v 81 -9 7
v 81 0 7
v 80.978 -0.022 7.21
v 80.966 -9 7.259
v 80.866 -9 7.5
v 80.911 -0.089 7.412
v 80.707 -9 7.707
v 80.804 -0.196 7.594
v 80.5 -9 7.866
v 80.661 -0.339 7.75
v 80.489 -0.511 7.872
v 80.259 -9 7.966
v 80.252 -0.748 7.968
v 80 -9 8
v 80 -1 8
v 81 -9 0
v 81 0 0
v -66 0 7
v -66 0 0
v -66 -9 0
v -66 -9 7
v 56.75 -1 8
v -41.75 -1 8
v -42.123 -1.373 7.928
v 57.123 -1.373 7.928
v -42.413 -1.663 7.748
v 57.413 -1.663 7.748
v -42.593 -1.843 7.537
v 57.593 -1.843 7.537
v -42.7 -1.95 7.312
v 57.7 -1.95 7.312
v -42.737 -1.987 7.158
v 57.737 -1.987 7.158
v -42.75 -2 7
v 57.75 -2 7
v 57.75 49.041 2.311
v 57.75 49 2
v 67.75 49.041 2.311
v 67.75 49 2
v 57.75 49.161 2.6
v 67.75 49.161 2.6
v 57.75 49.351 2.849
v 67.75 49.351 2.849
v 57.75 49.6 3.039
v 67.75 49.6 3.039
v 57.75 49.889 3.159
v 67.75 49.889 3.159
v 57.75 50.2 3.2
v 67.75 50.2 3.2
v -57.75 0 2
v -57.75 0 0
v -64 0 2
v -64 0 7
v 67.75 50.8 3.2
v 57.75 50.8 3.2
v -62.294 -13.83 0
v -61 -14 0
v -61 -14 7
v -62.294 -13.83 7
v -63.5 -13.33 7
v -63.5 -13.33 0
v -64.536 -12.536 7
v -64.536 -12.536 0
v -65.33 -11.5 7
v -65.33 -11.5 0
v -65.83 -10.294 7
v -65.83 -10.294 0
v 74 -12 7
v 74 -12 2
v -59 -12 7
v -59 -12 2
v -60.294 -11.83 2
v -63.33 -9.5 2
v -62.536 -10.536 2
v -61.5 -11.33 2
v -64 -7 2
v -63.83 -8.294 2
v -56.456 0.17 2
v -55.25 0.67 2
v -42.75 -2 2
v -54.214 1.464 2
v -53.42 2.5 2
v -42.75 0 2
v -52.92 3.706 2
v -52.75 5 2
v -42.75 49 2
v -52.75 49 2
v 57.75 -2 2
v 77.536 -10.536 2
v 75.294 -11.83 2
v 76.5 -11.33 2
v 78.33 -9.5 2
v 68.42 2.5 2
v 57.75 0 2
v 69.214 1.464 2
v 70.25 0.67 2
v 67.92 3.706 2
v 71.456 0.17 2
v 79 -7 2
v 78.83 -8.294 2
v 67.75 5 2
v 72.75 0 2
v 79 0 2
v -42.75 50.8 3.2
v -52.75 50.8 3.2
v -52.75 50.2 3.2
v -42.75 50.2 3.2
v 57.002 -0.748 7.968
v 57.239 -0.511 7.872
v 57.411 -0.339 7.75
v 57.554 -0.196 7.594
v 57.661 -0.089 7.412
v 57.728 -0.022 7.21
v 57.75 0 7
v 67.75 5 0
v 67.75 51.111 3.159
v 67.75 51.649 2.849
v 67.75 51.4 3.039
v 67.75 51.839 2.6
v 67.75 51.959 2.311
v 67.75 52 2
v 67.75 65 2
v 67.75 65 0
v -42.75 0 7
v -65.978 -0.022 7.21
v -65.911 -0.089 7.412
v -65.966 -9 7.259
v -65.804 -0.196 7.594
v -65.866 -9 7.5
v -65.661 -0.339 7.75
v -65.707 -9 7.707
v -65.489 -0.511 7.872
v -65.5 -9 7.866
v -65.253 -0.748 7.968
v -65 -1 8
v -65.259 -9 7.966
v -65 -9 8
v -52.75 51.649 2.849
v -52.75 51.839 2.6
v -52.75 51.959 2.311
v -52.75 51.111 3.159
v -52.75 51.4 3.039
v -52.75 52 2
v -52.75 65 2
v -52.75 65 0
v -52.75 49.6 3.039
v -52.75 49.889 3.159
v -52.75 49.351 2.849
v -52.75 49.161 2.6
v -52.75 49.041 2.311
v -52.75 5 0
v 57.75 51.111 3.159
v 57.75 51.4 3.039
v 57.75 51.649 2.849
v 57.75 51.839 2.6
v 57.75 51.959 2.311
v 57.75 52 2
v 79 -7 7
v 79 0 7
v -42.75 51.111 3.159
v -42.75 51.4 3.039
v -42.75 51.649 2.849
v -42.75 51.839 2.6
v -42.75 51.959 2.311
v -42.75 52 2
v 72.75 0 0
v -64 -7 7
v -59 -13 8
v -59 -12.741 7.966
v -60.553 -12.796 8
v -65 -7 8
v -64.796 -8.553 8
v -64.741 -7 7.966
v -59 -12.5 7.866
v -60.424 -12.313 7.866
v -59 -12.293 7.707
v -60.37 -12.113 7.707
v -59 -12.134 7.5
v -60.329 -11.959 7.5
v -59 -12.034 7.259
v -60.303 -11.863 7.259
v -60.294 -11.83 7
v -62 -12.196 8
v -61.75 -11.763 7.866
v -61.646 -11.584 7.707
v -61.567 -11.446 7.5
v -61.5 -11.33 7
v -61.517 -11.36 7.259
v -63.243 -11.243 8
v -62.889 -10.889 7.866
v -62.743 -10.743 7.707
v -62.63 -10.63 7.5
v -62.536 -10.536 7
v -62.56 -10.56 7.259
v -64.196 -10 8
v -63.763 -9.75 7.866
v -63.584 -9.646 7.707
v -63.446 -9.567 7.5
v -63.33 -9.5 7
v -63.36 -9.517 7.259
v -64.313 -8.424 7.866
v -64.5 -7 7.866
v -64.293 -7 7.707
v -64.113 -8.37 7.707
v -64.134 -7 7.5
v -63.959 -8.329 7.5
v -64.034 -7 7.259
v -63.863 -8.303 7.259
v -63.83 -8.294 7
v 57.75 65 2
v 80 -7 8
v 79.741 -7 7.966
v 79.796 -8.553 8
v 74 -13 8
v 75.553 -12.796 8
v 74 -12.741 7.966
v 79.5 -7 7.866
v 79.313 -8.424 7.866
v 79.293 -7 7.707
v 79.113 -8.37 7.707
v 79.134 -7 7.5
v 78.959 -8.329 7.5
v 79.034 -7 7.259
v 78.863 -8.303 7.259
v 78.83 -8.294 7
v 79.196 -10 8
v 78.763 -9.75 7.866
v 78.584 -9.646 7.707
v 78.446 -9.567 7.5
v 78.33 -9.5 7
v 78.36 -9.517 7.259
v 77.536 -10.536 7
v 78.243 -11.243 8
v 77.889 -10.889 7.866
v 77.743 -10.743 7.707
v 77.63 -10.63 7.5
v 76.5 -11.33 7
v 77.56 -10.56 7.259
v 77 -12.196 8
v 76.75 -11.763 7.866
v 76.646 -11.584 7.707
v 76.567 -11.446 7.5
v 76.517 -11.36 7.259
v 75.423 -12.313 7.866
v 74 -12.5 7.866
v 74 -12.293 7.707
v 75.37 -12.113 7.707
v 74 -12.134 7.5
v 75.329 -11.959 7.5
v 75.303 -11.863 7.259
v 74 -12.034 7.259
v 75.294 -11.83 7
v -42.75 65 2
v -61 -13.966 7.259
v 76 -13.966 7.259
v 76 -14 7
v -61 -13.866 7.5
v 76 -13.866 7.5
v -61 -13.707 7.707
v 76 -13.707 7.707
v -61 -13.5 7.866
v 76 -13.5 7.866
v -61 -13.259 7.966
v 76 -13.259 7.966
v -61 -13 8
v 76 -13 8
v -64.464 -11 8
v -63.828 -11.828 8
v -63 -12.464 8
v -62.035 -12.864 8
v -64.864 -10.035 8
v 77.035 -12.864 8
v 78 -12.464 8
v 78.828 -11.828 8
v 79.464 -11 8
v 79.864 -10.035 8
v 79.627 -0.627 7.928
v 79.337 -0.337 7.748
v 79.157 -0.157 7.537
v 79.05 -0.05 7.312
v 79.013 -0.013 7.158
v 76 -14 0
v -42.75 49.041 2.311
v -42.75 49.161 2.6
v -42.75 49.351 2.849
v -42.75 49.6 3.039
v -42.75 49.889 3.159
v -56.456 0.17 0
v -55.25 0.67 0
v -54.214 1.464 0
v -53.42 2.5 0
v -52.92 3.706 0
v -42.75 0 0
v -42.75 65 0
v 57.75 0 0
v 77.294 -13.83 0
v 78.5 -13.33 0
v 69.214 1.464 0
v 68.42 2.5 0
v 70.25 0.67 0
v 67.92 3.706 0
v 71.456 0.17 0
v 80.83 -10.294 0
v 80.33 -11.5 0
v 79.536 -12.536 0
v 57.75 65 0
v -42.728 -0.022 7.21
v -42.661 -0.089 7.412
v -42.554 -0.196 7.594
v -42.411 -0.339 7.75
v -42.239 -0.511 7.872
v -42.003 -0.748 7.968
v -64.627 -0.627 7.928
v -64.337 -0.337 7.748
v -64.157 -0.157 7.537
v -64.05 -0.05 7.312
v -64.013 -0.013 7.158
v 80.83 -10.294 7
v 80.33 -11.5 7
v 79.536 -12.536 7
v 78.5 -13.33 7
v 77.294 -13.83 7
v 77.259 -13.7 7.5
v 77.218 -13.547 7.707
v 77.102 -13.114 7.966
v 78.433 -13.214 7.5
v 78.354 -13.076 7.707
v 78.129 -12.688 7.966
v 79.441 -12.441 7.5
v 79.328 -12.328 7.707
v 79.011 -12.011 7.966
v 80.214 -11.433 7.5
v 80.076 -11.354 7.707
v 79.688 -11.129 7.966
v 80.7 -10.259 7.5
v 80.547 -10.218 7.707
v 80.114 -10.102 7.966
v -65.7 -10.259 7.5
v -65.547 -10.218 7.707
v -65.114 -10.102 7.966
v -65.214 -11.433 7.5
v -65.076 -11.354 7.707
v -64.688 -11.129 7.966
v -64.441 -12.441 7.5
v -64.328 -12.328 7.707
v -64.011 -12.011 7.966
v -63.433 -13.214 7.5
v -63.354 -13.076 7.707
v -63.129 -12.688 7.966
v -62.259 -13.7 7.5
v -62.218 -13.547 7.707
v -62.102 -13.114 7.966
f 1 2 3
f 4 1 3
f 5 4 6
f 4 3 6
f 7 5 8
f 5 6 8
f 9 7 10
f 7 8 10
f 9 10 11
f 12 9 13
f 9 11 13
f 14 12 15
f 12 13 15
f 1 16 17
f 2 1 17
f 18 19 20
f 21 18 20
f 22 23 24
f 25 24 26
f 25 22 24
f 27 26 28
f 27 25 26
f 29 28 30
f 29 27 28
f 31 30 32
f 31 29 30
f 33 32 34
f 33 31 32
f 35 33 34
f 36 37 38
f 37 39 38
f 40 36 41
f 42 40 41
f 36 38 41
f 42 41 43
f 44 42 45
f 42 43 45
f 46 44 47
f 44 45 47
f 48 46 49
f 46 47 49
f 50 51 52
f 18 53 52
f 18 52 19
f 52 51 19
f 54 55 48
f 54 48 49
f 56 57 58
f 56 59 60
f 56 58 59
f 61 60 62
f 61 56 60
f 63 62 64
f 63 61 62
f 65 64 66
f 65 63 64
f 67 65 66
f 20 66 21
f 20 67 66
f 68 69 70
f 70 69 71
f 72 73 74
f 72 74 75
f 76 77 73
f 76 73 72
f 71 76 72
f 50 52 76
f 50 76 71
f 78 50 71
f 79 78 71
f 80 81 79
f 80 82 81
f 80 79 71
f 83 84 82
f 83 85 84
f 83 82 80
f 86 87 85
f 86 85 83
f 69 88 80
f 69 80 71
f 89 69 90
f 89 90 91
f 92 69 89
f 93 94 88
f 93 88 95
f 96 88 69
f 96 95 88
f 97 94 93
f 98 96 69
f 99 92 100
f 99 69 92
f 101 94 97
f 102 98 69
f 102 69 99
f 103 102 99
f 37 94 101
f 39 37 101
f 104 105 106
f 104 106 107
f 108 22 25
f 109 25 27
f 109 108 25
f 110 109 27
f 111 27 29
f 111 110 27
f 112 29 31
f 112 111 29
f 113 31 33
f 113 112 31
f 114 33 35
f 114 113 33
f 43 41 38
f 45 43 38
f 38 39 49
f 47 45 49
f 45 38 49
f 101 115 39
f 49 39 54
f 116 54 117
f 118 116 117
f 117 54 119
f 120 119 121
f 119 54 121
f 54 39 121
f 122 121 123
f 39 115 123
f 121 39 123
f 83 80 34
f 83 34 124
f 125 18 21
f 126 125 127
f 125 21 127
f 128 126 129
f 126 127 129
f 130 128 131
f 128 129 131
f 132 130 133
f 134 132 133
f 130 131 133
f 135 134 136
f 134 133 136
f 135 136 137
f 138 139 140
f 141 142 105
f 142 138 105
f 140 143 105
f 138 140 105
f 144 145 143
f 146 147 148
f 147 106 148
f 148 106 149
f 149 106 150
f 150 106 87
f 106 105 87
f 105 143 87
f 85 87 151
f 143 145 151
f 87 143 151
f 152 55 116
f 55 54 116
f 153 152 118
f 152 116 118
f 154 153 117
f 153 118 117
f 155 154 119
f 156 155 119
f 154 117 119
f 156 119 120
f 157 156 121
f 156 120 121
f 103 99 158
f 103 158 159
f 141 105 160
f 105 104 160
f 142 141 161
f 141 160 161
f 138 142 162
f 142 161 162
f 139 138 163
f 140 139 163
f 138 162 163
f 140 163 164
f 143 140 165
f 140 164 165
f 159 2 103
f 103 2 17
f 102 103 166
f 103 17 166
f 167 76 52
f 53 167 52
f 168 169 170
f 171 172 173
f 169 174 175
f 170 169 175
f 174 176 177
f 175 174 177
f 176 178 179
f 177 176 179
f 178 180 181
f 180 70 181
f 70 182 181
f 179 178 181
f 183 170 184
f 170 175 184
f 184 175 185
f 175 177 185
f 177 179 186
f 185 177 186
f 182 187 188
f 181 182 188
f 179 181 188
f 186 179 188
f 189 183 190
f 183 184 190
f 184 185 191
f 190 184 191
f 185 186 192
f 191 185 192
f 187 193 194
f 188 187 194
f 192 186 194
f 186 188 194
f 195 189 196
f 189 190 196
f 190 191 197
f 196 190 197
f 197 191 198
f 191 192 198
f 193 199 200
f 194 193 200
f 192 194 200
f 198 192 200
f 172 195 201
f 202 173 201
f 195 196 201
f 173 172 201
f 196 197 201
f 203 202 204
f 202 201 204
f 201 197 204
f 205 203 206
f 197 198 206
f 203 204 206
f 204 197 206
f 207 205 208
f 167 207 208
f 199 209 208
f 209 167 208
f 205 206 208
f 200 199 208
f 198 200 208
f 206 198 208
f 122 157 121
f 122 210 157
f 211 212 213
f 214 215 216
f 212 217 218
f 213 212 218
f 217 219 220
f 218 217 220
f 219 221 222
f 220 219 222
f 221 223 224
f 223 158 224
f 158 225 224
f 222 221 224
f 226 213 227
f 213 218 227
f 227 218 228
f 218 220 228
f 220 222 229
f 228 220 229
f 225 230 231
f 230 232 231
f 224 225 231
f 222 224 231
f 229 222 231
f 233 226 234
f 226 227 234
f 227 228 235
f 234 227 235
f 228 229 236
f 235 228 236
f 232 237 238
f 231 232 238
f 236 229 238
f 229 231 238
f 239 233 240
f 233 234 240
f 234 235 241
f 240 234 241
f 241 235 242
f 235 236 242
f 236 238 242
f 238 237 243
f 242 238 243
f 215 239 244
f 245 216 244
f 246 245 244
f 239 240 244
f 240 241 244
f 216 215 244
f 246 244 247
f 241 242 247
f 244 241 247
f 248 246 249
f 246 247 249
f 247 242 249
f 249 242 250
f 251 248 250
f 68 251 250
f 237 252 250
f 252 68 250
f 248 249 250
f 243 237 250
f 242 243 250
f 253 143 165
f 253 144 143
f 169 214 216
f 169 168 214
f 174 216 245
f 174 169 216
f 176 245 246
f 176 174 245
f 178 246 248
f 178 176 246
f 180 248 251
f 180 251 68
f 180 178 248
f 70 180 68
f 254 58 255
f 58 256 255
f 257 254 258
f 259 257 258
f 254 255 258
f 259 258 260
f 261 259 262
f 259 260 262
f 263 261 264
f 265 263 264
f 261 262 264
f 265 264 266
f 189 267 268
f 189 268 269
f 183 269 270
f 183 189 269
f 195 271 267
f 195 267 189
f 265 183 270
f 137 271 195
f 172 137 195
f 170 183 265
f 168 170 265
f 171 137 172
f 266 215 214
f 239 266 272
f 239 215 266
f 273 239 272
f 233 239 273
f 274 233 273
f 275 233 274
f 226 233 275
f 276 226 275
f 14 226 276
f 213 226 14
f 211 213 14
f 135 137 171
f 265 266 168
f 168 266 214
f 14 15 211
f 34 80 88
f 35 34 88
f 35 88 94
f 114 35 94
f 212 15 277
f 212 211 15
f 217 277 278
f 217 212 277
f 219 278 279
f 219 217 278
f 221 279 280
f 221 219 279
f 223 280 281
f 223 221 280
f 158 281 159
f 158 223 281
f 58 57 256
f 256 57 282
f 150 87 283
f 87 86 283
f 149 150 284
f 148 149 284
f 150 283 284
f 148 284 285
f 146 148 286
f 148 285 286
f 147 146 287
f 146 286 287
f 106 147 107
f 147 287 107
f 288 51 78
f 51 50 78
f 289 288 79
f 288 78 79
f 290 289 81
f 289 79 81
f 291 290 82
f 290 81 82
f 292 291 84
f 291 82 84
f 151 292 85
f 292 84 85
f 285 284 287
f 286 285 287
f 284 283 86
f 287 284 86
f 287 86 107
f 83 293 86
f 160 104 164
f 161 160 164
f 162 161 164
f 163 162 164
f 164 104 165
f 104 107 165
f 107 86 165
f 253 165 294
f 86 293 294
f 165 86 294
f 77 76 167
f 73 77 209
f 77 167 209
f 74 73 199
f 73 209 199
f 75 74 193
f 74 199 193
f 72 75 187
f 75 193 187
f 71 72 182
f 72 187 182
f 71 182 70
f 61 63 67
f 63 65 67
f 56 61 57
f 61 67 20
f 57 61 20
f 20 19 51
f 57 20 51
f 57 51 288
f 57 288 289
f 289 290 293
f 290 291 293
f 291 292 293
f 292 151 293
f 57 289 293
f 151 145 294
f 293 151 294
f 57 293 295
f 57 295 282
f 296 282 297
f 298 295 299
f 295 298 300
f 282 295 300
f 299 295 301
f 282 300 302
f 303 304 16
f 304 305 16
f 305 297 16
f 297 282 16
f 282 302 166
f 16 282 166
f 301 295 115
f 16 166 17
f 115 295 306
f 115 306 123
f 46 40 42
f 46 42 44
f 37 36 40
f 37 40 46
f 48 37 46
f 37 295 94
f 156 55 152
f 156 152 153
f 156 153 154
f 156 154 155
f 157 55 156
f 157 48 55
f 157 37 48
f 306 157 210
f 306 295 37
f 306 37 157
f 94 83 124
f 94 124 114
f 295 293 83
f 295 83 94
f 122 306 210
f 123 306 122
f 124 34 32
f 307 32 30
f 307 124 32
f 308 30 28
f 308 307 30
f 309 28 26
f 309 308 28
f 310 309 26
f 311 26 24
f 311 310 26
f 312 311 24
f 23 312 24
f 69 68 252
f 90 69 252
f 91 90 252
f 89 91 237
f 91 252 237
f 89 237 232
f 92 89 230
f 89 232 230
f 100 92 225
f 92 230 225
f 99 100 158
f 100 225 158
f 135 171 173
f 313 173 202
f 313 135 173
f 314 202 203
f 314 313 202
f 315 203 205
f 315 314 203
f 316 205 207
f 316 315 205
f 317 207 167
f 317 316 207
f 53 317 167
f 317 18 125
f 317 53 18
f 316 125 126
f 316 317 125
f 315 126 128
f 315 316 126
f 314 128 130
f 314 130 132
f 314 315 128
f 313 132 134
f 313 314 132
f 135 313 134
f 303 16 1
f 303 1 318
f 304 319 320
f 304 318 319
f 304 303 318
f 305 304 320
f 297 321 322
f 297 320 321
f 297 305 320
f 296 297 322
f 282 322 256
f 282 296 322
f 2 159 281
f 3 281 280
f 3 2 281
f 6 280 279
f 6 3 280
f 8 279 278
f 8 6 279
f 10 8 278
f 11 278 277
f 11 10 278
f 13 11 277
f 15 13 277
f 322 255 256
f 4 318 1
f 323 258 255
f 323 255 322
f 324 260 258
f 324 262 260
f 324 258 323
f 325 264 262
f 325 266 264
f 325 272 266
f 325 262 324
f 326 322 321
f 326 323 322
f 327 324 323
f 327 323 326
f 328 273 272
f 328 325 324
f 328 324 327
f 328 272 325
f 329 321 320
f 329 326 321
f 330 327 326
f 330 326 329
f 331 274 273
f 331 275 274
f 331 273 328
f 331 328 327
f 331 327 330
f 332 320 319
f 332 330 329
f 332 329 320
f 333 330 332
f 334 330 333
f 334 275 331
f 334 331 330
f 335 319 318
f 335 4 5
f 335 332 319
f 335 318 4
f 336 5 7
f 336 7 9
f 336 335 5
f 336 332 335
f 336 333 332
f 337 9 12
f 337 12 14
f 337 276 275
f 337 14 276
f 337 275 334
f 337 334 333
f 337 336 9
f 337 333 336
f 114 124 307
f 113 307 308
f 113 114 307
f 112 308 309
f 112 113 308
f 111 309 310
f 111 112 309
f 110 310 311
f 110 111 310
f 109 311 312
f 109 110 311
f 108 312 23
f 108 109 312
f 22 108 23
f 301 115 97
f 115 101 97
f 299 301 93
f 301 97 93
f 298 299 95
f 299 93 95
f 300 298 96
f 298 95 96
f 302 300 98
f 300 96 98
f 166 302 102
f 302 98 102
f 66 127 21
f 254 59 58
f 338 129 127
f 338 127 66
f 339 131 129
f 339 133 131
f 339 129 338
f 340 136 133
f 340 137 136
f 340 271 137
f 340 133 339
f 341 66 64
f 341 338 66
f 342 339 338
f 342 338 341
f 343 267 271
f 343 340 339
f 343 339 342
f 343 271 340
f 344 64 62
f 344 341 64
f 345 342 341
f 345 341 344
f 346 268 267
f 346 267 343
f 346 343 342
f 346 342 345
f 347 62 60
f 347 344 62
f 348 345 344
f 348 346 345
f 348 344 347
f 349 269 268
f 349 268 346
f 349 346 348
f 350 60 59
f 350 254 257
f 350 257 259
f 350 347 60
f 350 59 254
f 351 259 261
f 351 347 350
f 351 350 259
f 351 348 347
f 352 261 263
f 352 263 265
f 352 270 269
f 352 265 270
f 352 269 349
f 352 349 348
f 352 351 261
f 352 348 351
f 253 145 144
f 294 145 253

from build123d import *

# Parameters (mm, degrees)
F2_W     = 10
F2_H     = 65
F2_W_2   = 11.25
F2_H_2   = 12
F2_W_3   = 100.5
F2_H_3   = 2
F2_W_4   = 2
F2_H_4   = 10
F3_DEPTH = 2
F4_DEPTH = 8
F5_R     = 5
F6_R     = 0.99999
F7_W     = 10
F7_H     = 3
F8_DEPTH = 1.2
F9_R     = 1.19999


# Not quite as in the source:
# - a fillet or chamfer is up to 0.001 mm smaller than in the source, because OpenCascade refuses the exact size


with BuildPart() as f3:
    # F2 (on Top) → F3 (new body)
    with BuildSketch(Plane.XY):
        with Locations((-47.7500067828, 32.5)):
            Rectangle(F2_W, F2_H)
        Polygon((-42.7500067828, 0), (-52.7500067828, 0), (-52.7500067828, -12), (-42.7500067828, -12), (-42.7500067828, -2), align=None)
        with Locations((-58.3750067828, -6)):
            Rectangle(F2_W_2, F2_H_2)
        with Locations((7.4999932172, -1)):
            Rectangle(F2_W_3, F2_H_3)
        Polygon((-42.7500067828, -12), (-52.7500067828, -12), (-64.0000067828, -12), (-66.0000067828, -12), (-66.0000067828, -14), (80.9999932172, -14), (80.9999932172, -12), (78.9999932172, -12), (67.7499932172, -12), (57.7499932172, -12), align=None)
        with Locations((-65.0000067828, -6)):
            Rectangle(F2_W_4, F2_H_2)
        with Locations((62.7499932172, 32.5)):
            Rectangle(F2_W, F2_H)
        Polygon((67.7499932172, 0), (57.7499932172, 0), (57.7499932172, -2), (57.7499932172, -12), (67.7499932172, -12), align=None)
        with Locations((73.3749932172, -6)):
            Rectangle(F2_W_2, F2_H_2)
        with Locations((79.9999932172, -6)):
            Rectangle(F2_W_4, F2_H_2)
        with Locations((7.4999932172, -7)):
            Rectangle(F2_W_3, F2_H_4)
    extrude(amount=F3_DEPTH)

    # F2 (on Top) → F4 (join)
    with BuildSketch(Plane.XY):
        with Locations((-65.0000067828, -6)):
            Rectangle(F2_W_4, F2_H_2)
        Polygon((-42.7500067828, -12), (-52.7500067828, -12), (-64.0000067828, -12), (-66.0000067828, -12), (-66.0000067828, -14), (80.9999932172, -14), (80.9999932172, -12), (78.9999932172, -12), (67.7499932172, -12), (57.7499932172, -12), align=None)
        with Locations((79.9999932172, -6)):
            Rectangle(F2_W_4, F2_H_2)
        with Locations((7.4999932172, -1)):
            Rectangle(F2_W_3, F2_H_3)
    extrude(amount=F4_DEPTH)

    # F5
    f5_edges = [f3.edges().sort_by_distance(p)[0] for p in [
        (-66.000007, -14, 4),
        (80.999993, -14, 4),
        (-64.000007, -12, 5),
        (78.999993, -12, 5),
        (67.749993, 0, 1),
        (-52.750007, 0, 1),
    ]]
    fillet(f5_edges, radius=F5_R)

    # F6 (radius 1 in the source; OpenCascade refuses exactly that, so slightly less here)
    f6_edges = [f3.edges().sort_by_distance(p)[0] for p in [
        (7.499993, -14, 8),
        (7.499993, -12, 8),
        (79.999993, 0, 8),
        (-65.000007, 0, 8),
        (7.499993, -2, 8),
        (7.499993, 0, 8),
        (57.749993, -1, 8),
        (-42.750007, -1, 8),
    ]]
    fillet(f6_edges, radius=F6_R)

    # F7 (on face) → F8 (join)
    with BuildSketch(Plane.XY.offset(2)):
        with Locations((-47.7500067828, 50.5)):
            Rectangle(F7_W, F7_H)
        with Locations((62.7499932172, 50.5)):
            Rectangle(F7_W, F7_H)
    extrude(amount=F8_DEPTH)

    # F9 (radius 1.2 in the source; OpenCascade refuses exactly that, so slightly less here)
    f9_edges = [f3.edges().sort_by_distance(p)[0] for p in [
        (-47.750007, 49, 3.2),
        (-47.750007, 52, 3.2),
        (62.749993, 49, 3.2),
        (62.749993, 52, 3.2),
    ]]
    fillet(f9_edges, radius=F9_R)


solid = f3.part
